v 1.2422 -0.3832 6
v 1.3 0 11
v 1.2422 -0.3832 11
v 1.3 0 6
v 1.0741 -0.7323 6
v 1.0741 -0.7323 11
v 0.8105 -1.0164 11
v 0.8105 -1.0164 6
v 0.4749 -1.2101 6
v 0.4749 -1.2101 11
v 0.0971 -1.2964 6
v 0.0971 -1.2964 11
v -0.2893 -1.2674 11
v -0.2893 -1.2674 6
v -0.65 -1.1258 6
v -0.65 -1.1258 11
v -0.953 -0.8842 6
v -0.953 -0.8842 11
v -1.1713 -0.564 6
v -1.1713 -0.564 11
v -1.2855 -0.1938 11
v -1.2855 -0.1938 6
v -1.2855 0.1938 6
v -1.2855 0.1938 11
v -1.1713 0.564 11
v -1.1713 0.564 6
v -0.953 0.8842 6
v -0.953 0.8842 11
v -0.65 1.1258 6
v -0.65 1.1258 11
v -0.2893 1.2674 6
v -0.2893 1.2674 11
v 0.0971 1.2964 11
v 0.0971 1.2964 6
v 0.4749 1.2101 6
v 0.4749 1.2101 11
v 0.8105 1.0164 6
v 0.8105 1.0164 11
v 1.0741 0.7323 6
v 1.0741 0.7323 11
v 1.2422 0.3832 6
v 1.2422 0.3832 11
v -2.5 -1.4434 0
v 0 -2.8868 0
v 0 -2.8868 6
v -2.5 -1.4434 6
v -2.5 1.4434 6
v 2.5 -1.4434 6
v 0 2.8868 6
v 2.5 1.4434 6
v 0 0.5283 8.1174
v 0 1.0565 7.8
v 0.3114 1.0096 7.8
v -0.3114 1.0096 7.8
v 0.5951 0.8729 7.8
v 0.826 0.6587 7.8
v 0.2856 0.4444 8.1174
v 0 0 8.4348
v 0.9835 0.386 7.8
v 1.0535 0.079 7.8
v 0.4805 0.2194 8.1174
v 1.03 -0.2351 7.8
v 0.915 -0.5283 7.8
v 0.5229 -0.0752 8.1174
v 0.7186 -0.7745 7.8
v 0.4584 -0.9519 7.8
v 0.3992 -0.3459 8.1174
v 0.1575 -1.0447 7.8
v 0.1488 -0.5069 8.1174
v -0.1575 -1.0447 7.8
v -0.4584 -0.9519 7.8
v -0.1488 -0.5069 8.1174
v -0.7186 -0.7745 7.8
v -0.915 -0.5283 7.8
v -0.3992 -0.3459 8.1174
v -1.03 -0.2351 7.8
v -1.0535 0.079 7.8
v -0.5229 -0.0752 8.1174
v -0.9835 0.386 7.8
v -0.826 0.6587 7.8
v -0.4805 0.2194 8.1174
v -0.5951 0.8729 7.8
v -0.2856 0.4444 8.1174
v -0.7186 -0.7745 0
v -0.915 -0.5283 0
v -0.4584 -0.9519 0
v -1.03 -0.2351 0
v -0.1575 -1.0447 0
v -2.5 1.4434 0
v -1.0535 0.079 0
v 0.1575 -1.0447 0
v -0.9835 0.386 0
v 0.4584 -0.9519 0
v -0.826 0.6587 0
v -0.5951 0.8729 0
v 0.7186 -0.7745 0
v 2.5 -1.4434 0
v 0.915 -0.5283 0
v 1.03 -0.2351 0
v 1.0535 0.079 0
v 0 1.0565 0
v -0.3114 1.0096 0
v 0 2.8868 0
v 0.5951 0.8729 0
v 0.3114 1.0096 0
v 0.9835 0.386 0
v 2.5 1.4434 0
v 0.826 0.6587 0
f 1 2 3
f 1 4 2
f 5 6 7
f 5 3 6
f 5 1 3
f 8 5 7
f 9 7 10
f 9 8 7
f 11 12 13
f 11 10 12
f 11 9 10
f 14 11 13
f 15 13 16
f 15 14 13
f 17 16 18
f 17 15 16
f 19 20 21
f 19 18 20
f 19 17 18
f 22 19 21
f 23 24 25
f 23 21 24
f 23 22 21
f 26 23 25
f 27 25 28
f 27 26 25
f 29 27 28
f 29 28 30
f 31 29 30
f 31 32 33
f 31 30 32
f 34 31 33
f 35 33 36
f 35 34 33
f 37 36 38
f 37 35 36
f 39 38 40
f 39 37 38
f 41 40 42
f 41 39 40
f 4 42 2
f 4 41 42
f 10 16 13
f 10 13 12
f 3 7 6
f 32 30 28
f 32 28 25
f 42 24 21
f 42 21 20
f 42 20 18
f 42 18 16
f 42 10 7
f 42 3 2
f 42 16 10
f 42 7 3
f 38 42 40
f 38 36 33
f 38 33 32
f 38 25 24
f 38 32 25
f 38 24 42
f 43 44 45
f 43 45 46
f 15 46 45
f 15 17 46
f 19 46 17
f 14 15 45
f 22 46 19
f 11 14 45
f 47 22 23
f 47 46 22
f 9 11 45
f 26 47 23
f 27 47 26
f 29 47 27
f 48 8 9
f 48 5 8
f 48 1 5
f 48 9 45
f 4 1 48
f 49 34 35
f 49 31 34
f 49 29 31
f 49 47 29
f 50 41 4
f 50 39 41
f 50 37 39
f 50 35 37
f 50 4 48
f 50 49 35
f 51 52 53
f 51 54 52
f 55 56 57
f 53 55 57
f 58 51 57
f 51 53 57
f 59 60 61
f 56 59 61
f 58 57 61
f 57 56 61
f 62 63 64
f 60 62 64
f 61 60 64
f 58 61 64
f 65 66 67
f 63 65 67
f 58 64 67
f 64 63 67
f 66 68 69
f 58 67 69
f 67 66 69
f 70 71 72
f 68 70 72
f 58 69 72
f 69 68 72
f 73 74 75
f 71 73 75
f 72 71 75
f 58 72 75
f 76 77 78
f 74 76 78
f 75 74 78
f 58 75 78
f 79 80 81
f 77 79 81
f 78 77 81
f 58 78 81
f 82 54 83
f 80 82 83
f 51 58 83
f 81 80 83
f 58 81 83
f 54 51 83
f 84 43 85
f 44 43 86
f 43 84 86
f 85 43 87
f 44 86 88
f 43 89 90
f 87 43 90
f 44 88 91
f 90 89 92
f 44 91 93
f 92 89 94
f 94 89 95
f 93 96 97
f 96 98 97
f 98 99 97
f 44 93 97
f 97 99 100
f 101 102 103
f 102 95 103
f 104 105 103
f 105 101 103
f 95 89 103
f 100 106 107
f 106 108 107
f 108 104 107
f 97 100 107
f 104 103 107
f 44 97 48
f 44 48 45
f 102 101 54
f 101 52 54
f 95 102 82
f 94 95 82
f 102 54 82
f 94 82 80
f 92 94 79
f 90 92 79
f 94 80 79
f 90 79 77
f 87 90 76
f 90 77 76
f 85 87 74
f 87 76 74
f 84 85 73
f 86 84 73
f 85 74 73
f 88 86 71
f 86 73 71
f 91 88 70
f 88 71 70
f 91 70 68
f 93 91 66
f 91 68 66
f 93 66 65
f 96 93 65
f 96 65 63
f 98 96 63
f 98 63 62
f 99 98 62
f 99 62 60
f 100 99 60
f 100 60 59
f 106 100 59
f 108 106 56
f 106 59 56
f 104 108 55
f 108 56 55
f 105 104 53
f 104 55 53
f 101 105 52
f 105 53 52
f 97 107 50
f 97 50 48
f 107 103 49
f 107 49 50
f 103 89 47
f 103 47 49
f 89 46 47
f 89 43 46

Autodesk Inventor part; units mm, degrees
ref_plane "YZ Plane" through (0, 0, 0) normal (1, 0, 0) x (0, 1, 0)
ref_plane "XZ Plane" through (0, 0, 0) normal (0, 1, 0) x (-1, 0, 0)
ref_plane "XY Plane" through (0, 0, 0) normal (0, 0, 1) x (1, 0, 0)
sketch "スケッチ1" plane through (0, 0, 0) normal (0, 0, 1) x (1, 0, 0)
  line L0 (0, 2.8868) -> (2.5, 1.4434)
  line L1 (2.5, 1.4434) -> (2.5, -1.4434)
  line L2 (2.5, -1.4434) -> (0, -2.8868)
  line L3 (0, -2.8868) -> (-2.5, -1.4434)
  line L4 (-2.5, -1.4434) -> (-2.5, 1.4434)
  line L5 (-2.5, 1.4434) -> (0, 2.8868)
  point P0 (0, 0)
  point P1 (0, 0)
  dimension "d0" = 5
extrude "押し出し1" add sketch "スケッチ1" along normal blind 6
sketch "スケッチ2" plane through (0, 0, 6) normal (0, 0, 1) x (1, 0, 0)
  circle A0 centre (0, 0) radius 1.3
  dimension "d3" = 2.6
extrude "押し出し2" add sketch "スケッチ2" along normal blind 5
thread "ねじ1" size "M2.6x0.45" class "6g" standard "ANSI Metric M Profile" full length
sketch "スケッチ3" plane through (0, 0, 0) normal (0, 0, -1) x (-1, 0, 0)
  point P0 (0, 0)
hole "穴1" at (0, 0, 0) direction (0, 0, 1) diameter 2.113 depth 7.8 tip angle 118 thread size "M2.6x0.45" class "6H" standard "ISO Metric profile"
properties part number "ジュラコンスペーサー（六角）_BS-2606E" material "アセタール樹脂、白"
